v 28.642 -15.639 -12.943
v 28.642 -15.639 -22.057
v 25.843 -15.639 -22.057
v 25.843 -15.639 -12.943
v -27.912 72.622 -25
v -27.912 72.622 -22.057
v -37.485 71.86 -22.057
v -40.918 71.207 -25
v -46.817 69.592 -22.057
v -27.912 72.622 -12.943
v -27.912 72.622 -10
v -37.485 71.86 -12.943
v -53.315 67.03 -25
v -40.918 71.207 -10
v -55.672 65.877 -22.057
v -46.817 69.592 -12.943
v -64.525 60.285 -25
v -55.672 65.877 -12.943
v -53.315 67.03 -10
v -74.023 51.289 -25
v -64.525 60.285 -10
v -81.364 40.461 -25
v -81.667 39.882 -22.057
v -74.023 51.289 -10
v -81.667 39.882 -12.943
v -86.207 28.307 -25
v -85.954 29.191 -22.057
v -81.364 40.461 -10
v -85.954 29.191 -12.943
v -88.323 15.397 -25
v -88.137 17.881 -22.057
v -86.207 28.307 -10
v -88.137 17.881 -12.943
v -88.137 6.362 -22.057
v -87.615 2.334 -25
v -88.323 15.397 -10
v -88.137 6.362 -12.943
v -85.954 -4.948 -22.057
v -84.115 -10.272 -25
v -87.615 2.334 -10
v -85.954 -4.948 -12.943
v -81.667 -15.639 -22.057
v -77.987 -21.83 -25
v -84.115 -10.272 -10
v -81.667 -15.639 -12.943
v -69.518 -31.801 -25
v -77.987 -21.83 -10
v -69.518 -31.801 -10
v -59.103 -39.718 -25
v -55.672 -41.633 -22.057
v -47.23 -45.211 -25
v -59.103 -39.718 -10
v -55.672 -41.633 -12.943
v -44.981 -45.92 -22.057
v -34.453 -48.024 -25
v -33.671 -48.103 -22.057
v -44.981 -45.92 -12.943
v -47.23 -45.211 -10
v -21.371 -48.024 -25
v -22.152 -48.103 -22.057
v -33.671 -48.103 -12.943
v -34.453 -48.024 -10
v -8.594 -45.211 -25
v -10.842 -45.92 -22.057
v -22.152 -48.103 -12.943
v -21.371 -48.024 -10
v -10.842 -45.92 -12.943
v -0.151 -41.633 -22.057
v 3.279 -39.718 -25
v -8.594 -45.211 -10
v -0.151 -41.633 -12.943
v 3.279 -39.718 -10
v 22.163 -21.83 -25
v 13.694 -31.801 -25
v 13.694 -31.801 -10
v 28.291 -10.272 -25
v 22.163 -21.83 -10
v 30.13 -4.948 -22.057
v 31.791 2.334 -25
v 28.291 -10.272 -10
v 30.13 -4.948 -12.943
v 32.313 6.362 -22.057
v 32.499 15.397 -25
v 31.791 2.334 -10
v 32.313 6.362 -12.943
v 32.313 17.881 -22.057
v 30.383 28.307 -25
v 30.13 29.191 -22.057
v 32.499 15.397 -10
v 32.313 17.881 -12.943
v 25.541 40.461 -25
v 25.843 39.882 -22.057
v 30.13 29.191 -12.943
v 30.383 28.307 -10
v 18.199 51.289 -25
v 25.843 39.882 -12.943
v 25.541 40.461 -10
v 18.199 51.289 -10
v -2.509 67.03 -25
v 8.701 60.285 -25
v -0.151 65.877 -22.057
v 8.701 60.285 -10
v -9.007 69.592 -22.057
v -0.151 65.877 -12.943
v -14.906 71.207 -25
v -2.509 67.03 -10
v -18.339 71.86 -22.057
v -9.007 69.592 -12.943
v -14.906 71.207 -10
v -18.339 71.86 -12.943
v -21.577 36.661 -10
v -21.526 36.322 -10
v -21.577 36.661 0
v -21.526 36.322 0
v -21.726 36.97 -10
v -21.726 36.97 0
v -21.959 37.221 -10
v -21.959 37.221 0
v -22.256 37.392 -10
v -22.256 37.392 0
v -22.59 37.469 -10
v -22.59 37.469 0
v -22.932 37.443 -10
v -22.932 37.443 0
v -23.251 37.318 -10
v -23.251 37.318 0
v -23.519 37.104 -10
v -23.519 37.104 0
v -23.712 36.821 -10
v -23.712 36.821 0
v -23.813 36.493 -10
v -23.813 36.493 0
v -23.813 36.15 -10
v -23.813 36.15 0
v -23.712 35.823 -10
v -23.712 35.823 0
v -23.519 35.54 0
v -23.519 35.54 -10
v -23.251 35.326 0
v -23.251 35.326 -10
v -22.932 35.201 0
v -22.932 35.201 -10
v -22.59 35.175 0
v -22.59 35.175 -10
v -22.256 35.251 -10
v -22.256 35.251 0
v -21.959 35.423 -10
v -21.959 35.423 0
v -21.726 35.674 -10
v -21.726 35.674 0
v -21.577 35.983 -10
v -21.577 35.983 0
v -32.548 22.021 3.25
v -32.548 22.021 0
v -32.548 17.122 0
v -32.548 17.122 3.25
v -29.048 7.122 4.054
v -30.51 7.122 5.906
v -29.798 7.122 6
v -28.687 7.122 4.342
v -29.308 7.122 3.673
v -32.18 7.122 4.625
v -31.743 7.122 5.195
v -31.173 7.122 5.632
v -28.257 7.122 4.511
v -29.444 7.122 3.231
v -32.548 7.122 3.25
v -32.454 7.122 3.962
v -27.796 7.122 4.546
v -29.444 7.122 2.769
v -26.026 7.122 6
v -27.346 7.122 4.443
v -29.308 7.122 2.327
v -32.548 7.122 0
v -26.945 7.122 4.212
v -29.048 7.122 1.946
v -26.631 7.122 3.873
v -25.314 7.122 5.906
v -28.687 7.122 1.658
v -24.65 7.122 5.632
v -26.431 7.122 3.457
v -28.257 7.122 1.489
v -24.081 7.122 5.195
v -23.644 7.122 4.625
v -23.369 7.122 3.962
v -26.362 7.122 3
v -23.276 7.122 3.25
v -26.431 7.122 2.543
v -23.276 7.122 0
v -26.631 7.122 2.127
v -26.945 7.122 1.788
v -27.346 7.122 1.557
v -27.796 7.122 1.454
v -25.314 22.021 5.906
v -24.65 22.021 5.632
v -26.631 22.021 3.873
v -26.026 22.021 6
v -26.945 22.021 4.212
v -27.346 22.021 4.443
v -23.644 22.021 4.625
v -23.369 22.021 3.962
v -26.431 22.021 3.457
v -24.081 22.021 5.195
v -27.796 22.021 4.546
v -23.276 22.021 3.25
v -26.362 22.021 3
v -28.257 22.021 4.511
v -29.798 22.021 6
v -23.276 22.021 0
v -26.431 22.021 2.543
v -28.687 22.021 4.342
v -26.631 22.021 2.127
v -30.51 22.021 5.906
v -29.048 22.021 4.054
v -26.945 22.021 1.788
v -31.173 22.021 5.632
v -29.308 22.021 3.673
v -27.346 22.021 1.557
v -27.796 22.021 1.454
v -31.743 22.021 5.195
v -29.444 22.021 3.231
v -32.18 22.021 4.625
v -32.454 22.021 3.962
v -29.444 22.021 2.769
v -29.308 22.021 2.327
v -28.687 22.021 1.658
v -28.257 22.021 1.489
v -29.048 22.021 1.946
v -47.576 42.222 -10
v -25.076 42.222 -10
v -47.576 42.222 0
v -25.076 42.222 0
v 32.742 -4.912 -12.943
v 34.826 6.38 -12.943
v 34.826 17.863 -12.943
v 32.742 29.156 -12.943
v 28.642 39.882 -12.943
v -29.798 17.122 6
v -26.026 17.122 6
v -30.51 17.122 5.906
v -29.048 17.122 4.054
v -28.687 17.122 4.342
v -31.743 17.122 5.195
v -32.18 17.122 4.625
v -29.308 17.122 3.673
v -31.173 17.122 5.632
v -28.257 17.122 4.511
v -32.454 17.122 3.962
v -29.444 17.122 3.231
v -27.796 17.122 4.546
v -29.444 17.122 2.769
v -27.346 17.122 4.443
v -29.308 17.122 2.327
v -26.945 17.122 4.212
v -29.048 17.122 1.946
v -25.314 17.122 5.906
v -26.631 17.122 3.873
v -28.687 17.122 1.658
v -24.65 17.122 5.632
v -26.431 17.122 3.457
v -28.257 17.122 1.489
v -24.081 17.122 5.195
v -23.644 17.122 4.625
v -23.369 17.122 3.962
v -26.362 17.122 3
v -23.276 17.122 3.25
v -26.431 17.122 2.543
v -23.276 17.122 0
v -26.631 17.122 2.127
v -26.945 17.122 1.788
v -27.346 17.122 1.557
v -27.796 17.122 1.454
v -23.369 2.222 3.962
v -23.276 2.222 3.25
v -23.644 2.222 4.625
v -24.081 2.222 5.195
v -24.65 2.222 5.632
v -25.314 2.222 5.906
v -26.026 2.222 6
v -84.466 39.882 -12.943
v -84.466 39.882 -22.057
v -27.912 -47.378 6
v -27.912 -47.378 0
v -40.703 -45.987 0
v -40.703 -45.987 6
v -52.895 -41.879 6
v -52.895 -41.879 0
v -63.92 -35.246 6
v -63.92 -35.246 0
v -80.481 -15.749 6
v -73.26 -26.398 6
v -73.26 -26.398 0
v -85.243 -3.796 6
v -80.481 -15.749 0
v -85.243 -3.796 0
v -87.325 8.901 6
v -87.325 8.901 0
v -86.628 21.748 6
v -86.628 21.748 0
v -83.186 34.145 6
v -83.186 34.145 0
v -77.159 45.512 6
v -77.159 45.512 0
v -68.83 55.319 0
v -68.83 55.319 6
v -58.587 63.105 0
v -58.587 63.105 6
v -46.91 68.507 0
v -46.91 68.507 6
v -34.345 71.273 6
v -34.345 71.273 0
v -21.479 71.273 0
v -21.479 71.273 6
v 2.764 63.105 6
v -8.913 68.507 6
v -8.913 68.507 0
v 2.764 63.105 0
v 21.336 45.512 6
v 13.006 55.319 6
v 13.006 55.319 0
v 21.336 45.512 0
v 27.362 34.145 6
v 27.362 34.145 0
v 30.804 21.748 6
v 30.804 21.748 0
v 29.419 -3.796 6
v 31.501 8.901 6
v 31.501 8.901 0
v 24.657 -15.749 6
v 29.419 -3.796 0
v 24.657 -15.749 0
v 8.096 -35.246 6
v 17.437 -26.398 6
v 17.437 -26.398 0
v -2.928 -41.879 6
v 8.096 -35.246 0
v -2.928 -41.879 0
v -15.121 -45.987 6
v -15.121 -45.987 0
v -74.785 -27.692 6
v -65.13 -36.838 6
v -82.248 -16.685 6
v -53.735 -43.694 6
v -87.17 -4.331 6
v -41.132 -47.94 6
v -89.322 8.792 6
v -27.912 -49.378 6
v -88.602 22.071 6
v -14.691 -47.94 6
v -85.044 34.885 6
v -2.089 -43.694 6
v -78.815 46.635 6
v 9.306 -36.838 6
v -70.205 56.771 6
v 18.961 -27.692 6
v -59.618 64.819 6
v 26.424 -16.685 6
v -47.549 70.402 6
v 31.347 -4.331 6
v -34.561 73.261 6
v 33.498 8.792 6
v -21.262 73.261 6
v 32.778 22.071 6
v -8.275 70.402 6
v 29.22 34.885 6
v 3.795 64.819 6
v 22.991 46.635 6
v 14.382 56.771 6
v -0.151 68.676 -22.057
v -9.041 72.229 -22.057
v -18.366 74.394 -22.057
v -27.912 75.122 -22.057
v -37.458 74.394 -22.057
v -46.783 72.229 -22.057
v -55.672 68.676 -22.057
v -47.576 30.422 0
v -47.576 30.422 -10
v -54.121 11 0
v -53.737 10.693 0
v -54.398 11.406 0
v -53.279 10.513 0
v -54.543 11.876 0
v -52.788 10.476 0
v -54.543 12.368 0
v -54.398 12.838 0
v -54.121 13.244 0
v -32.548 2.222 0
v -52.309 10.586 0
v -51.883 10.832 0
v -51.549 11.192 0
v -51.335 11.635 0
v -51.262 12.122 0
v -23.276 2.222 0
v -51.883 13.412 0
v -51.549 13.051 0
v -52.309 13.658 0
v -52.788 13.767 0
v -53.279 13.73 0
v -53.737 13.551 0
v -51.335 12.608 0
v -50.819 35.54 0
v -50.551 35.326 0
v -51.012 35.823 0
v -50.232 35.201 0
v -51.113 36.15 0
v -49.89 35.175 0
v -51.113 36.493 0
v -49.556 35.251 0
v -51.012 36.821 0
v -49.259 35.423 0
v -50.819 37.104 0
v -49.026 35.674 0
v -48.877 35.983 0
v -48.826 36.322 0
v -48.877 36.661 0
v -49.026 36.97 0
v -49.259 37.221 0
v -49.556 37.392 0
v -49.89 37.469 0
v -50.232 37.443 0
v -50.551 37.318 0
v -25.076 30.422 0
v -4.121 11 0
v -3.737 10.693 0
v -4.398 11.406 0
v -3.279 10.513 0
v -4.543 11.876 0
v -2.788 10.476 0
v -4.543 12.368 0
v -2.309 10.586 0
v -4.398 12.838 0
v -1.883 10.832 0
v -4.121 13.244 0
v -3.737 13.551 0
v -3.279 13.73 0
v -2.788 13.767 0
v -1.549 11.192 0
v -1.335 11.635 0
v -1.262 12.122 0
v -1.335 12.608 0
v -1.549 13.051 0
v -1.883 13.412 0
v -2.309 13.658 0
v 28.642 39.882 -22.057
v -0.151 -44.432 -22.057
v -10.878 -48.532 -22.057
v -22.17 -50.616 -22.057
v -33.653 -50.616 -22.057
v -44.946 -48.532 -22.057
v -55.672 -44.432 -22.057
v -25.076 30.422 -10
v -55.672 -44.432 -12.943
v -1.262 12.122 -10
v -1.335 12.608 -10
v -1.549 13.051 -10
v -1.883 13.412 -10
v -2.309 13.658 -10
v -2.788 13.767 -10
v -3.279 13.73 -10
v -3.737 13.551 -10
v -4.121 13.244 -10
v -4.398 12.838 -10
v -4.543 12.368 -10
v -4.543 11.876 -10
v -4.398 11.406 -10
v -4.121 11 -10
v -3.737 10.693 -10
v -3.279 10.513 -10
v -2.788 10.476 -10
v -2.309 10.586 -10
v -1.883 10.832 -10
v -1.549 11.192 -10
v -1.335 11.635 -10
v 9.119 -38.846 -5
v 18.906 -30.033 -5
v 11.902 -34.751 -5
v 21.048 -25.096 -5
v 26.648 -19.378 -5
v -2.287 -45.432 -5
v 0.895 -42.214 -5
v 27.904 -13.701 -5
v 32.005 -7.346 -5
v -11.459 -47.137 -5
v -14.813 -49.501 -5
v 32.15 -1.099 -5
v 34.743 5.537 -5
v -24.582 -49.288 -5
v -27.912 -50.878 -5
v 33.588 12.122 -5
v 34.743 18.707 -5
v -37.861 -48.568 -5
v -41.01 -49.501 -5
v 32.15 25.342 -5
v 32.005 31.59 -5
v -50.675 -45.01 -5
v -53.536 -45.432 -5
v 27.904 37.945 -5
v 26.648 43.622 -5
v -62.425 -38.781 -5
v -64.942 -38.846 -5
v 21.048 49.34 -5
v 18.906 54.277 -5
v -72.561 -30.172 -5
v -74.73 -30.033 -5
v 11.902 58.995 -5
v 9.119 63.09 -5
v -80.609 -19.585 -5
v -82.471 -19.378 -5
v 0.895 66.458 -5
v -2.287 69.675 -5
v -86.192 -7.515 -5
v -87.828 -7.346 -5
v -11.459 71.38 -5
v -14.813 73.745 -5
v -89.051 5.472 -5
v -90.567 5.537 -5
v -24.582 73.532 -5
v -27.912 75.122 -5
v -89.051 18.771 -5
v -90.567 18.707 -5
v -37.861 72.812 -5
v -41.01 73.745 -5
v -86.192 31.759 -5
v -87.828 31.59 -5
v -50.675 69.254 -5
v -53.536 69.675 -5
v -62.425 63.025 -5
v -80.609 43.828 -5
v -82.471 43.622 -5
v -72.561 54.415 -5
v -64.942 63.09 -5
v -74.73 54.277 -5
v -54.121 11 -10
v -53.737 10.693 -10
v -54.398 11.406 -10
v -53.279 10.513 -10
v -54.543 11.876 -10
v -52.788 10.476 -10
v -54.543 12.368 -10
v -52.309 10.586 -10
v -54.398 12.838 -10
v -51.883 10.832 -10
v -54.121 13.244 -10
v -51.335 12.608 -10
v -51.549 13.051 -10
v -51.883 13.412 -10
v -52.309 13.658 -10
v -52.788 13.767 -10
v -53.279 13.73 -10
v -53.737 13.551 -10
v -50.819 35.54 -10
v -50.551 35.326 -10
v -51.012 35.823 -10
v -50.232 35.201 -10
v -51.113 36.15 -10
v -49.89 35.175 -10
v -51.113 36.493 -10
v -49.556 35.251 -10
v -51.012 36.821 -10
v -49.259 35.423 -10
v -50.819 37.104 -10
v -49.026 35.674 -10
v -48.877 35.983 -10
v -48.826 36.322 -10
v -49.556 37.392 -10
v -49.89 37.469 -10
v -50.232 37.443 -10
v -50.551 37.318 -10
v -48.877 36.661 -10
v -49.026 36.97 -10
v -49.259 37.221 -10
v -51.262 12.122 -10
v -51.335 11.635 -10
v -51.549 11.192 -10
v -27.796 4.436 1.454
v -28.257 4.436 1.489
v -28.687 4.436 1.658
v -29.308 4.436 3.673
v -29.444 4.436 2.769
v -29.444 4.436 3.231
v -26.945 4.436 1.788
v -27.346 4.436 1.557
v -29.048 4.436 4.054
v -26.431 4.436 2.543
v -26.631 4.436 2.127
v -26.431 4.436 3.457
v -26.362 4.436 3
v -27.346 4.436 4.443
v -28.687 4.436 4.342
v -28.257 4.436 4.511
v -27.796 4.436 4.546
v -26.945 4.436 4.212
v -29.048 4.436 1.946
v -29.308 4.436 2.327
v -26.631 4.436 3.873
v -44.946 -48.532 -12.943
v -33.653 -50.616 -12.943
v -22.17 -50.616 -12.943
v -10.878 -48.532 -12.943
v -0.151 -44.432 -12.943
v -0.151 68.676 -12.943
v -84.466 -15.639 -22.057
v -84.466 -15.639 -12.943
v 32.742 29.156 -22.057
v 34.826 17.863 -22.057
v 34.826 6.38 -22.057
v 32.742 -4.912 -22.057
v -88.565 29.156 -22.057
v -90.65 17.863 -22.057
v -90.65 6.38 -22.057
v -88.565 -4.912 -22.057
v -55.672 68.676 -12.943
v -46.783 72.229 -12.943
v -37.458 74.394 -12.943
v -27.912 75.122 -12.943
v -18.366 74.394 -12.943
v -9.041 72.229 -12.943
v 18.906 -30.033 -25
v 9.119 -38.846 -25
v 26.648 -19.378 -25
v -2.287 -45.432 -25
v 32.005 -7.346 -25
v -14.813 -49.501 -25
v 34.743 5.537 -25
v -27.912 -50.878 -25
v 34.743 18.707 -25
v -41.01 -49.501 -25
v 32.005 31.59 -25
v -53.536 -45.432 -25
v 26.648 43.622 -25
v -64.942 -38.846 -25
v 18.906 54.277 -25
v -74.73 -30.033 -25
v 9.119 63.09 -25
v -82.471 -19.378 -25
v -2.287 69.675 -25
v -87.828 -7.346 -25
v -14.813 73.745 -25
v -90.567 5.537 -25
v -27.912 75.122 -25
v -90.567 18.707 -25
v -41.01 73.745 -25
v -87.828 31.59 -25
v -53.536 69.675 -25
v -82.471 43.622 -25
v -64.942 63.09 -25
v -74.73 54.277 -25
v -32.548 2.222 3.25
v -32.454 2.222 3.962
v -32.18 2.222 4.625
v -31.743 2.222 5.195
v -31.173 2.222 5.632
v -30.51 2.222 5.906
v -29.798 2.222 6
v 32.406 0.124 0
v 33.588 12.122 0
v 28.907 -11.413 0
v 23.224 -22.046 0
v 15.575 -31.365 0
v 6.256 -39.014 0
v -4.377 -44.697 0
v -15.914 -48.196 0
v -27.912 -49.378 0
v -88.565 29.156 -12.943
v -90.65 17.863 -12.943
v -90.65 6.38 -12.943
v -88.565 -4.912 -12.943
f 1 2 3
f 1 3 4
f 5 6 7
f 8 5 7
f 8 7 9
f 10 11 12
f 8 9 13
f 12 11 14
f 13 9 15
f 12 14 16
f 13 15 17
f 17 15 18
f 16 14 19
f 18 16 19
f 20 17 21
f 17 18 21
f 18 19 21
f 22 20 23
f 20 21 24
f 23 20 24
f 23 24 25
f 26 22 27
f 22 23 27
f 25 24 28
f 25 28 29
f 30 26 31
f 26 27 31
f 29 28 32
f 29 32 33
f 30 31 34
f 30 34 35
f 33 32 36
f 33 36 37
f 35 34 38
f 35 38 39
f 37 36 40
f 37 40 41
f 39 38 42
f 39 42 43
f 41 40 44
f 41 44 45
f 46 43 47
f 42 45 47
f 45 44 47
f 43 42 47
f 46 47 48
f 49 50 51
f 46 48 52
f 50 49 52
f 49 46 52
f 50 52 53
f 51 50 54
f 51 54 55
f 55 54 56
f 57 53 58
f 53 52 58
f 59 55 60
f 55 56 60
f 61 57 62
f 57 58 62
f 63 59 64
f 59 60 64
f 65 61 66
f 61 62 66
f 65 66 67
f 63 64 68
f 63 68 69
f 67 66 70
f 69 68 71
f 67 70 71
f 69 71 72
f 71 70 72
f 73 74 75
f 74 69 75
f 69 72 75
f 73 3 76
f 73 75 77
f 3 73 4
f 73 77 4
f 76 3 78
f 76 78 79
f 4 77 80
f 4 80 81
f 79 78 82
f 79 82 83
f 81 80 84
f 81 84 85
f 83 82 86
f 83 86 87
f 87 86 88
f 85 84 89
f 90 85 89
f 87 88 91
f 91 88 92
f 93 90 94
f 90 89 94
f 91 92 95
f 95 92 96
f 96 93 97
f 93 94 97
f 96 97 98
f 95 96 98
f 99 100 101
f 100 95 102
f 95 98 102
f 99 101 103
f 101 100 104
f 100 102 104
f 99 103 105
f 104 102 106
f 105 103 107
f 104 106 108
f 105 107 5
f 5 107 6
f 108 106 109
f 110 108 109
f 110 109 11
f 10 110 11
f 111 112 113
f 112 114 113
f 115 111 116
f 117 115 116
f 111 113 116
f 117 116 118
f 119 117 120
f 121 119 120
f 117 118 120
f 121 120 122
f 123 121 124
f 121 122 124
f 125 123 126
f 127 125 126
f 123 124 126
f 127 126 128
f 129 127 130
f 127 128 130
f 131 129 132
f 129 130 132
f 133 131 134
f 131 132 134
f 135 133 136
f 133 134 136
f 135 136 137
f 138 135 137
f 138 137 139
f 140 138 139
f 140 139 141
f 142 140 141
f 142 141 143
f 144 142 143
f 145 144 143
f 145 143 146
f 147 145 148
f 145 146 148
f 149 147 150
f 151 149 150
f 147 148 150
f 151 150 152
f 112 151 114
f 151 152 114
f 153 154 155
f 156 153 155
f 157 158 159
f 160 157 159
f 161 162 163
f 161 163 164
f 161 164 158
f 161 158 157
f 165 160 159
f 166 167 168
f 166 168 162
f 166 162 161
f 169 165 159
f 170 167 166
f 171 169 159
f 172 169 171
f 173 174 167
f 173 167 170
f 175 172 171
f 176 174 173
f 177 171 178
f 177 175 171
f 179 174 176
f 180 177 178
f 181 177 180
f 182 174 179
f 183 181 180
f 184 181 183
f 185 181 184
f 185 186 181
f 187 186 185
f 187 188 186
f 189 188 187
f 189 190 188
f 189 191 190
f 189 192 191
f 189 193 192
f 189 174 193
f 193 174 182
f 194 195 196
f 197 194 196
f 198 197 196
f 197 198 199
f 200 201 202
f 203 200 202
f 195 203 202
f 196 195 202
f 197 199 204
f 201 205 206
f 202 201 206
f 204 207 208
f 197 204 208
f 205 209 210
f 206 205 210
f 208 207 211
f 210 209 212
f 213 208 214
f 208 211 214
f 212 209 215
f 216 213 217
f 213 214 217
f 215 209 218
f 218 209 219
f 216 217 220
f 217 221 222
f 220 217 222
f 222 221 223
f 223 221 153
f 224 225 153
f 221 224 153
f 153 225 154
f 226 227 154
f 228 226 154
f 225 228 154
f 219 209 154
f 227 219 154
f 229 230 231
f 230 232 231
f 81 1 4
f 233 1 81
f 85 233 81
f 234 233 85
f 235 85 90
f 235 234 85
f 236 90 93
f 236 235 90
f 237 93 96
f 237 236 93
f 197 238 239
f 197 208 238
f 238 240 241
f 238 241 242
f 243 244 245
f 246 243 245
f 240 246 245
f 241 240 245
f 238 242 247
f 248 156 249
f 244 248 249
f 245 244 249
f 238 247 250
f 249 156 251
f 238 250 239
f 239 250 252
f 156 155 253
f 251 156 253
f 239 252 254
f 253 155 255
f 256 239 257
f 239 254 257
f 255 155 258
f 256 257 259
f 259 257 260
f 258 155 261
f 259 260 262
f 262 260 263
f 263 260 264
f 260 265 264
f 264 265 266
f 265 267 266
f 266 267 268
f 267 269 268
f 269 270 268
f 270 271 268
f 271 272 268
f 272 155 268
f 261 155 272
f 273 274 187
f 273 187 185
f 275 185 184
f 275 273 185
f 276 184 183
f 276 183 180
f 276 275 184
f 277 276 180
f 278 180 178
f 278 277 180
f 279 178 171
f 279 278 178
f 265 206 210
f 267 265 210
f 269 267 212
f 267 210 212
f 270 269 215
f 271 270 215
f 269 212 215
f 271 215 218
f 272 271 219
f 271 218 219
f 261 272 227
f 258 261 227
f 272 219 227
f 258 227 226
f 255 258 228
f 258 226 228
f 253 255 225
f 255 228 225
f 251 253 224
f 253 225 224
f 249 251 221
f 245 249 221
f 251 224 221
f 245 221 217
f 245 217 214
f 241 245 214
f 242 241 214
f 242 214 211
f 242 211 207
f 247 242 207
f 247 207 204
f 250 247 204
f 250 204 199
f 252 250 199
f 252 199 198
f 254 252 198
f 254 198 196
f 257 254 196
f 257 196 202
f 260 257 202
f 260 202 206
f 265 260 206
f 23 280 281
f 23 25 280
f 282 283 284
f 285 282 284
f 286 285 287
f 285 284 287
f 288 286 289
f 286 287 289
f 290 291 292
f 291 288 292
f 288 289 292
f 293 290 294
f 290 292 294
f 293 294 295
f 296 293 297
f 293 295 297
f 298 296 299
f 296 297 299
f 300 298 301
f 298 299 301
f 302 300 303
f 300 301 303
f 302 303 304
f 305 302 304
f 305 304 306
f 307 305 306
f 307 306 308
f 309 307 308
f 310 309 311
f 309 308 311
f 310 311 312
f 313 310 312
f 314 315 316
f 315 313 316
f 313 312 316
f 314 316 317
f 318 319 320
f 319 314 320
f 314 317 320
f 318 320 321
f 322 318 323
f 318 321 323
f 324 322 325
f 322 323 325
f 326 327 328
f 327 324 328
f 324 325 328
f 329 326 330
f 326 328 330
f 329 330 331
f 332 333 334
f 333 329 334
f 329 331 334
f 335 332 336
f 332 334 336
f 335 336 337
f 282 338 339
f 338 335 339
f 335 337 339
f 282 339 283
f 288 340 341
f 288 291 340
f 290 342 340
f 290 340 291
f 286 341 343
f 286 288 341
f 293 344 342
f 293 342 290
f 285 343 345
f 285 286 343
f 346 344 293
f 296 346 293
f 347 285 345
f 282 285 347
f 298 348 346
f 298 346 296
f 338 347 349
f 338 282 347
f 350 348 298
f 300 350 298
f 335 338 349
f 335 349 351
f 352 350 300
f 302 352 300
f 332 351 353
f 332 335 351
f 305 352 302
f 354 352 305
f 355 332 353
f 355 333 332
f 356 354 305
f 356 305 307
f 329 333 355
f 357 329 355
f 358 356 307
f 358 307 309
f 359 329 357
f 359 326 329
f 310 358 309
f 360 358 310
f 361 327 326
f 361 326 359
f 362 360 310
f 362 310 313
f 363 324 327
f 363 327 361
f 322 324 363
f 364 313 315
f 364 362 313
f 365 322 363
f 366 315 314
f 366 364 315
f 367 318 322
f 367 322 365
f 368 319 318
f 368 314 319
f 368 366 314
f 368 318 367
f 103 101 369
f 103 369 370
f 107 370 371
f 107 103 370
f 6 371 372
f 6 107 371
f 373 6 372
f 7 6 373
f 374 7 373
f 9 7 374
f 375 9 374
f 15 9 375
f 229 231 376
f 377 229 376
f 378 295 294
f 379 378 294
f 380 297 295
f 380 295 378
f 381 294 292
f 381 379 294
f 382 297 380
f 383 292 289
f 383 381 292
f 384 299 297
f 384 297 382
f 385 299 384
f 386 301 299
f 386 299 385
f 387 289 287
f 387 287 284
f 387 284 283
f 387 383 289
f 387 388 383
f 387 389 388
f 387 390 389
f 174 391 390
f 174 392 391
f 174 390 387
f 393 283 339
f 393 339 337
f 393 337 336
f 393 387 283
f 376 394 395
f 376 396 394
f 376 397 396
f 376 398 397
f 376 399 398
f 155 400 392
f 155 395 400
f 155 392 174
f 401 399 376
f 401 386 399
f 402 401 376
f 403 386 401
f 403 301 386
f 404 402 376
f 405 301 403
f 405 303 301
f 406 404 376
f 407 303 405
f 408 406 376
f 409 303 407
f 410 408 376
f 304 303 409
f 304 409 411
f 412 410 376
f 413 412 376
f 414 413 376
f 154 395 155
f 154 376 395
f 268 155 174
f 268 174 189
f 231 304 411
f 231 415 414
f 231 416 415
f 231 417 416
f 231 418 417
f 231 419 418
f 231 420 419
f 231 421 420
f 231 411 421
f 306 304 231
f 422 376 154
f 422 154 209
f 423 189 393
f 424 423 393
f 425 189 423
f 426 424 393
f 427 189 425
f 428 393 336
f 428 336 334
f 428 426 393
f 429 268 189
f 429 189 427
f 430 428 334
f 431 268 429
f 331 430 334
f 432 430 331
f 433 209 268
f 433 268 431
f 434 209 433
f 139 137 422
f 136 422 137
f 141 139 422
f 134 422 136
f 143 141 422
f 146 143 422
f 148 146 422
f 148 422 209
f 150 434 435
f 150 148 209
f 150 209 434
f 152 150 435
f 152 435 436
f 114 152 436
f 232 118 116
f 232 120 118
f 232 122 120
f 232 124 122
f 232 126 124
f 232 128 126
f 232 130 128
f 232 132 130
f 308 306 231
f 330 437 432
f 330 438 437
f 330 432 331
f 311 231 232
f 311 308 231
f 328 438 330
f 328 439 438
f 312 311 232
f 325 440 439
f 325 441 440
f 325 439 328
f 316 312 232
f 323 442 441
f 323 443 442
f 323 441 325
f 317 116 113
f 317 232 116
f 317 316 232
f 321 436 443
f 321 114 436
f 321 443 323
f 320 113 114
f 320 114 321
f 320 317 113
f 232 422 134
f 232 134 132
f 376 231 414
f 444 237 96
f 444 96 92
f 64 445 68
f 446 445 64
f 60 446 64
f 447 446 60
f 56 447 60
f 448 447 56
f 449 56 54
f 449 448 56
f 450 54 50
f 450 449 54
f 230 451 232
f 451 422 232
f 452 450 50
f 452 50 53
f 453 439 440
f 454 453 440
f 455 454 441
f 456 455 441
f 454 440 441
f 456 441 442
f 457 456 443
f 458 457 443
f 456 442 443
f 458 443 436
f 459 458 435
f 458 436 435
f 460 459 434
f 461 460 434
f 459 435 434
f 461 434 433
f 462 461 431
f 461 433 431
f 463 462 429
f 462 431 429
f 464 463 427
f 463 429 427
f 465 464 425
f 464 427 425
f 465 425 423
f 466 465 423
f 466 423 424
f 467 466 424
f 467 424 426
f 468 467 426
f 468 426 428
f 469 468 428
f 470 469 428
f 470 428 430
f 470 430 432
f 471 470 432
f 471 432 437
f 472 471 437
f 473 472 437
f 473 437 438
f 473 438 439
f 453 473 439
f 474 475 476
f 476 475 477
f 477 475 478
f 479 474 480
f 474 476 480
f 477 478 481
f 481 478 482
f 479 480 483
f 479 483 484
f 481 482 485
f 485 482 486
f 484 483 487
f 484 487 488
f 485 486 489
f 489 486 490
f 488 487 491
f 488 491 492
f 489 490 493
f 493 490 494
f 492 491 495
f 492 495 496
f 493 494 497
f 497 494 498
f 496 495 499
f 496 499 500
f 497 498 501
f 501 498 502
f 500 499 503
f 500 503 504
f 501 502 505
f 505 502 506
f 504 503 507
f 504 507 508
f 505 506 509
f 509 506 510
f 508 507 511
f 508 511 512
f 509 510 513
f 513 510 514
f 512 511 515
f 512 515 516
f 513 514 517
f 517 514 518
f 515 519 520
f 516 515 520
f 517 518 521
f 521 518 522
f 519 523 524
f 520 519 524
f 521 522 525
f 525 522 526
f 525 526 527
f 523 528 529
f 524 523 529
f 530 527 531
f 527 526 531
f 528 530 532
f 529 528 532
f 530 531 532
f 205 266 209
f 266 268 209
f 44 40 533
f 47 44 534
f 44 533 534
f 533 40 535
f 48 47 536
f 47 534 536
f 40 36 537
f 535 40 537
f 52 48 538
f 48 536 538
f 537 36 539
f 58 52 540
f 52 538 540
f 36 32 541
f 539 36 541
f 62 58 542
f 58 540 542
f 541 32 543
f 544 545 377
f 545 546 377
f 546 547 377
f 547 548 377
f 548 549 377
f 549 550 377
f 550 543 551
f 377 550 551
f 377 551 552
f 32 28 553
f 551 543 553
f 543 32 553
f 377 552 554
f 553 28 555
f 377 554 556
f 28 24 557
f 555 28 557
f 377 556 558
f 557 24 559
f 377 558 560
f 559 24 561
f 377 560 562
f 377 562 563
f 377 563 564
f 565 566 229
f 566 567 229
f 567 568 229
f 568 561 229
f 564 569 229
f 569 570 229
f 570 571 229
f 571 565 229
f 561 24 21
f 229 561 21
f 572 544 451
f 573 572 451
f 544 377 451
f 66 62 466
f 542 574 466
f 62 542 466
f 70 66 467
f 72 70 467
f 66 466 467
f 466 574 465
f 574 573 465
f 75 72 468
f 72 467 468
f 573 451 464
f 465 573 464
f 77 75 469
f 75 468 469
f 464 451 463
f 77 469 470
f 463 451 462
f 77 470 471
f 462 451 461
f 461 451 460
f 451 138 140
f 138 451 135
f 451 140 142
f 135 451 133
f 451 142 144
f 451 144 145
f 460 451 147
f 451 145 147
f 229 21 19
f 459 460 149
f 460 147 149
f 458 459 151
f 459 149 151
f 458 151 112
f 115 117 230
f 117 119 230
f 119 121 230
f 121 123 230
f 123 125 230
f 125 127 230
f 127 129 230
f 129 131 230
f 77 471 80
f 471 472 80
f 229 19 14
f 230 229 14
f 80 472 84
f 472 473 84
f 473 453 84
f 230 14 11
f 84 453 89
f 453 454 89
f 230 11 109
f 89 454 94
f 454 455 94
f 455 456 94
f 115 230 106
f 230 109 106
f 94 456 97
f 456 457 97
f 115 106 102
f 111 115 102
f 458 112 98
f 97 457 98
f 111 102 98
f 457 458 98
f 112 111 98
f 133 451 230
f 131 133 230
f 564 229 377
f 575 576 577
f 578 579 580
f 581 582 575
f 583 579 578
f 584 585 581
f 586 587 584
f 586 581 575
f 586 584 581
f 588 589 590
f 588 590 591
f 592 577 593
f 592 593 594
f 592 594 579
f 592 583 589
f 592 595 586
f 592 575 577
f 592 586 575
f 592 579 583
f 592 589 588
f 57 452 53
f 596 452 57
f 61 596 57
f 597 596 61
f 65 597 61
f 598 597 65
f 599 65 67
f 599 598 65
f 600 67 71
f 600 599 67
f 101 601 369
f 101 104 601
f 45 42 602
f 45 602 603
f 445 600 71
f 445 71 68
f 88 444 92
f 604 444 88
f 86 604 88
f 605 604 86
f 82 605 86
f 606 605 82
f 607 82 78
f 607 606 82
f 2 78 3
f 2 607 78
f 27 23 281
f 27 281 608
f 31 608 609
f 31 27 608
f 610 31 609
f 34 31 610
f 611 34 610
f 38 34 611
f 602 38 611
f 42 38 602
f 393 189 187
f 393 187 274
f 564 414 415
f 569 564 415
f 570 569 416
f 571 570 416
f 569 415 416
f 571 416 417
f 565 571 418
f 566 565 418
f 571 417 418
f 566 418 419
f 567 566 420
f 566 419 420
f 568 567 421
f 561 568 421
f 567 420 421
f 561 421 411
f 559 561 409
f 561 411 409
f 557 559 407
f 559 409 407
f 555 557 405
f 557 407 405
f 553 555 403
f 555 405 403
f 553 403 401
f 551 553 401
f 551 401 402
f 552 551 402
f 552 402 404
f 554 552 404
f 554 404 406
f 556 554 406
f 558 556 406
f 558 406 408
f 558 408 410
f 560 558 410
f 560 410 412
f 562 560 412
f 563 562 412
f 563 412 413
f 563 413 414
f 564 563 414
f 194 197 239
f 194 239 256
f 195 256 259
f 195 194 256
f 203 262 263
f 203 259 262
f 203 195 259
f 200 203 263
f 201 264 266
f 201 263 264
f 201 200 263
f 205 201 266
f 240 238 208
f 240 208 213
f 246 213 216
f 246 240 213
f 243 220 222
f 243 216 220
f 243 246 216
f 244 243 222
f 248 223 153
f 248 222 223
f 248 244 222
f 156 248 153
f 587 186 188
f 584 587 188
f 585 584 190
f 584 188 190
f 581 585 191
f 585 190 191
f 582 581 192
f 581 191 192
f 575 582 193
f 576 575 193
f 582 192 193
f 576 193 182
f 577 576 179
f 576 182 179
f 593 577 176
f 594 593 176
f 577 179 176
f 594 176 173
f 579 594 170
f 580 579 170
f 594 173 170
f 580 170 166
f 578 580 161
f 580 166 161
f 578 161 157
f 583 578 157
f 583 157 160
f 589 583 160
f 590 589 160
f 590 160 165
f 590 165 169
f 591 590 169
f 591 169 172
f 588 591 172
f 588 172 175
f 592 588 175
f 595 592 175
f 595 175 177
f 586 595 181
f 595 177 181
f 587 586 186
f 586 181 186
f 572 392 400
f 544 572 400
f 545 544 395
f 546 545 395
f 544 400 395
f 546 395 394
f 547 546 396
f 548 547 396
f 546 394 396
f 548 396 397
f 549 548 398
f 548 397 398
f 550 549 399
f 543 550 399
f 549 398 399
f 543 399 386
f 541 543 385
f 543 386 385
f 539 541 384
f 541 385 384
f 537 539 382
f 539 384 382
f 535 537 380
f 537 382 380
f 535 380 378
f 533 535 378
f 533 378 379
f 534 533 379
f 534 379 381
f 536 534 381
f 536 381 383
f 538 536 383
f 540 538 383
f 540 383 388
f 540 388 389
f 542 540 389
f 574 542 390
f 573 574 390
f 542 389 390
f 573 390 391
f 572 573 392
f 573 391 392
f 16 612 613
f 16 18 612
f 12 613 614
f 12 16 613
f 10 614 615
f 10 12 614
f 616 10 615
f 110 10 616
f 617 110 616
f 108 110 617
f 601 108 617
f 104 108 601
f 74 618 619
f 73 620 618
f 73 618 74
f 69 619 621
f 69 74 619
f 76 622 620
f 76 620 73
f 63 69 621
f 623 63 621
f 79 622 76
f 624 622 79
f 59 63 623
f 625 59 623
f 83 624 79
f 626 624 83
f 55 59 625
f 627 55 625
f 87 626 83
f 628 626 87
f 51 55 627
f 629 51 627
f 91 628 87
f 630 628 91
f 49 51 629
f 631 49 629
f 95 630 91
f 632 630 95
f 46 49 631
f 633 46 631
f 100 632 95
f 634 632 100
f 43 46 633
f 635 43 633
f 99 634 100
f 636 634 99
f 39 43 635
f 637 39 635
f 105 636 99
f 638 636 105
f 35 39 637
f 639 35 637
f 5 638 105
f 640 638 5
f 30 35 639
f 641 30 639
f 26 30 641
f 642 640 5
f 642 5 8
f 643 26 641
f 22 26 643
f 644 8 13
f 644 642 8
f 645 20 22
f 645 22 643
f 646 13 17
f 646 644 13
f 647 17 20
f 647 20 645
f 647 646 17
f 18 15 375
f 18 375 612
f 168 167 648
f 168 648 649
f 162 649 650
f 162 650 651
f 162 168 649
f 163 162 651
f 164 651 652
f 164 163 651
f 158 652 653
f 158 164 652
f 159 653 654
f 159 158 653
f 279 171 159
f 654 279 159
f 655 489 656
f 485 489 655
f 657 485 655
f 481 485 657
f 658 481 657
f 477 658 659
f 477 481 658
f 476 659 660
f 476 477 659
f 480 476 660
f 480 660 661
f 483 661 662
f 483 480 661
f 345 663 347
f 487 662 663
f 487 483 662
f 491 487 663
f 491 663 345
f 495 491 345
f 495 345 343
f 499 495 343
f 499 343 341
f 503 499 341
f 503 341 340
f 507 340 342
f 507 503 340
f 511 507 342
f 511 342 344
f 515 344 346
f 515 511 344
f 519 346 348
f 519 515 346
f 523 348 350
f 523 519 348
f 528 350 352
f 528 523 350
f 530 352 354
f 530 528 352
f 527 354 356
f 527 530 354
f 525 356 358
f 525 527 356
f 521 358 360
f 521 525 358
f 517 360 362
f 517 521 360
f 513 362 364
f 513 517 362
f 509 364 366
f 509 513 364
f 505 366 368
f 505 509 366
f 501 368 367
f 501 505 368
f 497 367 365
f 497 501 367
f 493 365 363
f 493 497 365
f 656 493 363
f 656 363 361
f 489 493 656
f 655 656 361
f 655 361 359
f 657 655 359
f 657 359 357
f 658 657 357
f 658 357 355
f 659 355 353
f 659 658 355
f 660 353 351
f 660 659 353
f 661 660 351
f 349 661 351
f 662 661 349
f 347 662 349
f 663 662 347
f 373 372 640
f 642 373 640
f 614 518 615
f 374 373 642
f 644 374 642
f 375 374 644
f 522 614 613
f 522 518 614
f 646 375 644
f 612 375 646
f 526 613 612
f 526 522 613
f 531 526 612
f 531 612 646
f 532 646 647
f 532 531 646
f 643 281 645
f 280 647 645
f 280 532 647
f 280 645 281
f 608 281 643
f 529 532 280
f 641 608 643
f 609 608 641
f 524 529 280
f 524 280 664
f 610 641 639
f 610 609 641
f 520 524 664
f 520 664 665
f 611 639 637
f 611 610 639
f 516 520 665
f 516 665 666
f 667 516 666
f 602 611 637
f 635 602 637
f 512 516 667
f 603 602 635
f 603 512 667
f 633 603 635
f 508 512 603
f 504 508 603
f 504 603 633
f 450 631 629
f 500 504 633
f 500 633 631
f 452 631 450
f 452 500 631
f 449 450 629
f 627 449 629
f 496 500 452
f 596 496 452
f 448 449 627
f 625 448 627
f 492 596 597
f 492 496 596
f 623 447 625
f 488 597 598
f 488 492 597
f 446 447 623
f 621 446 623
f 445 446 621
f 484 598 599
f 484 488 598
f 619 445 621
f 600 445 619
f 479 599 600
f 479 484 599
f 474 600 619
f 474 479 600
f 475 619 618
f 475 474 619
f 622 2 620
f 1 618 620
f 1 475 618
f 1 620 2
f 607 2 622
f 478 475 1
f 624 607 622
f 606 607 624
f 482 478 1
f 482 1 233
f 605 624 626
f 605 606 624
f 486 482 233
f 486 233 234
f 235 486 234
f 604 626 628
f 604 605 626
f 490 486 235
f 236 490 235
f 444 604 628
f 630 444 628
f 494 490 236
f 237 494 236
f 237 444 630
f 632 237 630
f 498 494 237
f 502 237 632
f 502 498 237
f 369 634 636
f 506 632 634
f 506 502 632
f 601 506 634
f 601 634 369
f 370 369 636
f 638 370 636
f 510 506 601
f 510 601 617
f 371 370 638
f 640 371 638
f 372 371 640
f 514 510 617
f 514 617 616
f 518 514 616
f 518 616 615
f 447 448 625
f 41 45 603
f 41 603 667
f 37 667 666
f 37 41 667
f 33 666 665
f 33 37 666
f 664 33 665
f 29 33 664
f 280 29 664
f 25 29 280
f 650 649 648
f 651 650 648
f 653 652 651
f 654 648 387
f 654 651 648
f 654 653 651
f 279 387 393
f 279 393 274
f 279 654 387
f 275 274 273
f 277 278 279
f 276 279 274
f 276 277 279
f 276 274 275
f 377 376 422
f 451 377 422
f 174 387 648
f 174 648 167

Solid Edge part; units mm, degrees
sketch "Sketch1" plane through (0, 0, 0) normal (0, 0, 1) x (1, 0, 0)
  line L0 (-15.0761, 2.2218) -> (-15.0761, 52.2218)
  line L1 (-15.0761, 52.2218) -> (-57.5761, 52.2218)
  line L2 (-57.5761, 52.2218) -> (-57.5761, 2.2218)
  line L3 (-57.5761, 2.2218) -> (-15.0761, 2.2218)
  line L4 (-25.0761, 30.4218) -> (-25.0761, 42.2218)
  line L5 (-25.0761, 42.2218) -> (-47.5761, 42.2218)
  line L6 (-47.5761, 42.2218) -> (-47.5761, 30.4218)
  line L7 (-47.5761, 30.4218) -> (-25.0761, 30.4218)
  dimension "D1" = 22.5
  dimension "D2" = 11.8
  dimension "D3" = 50
  dimension "D4" = 42.5
  dimension "D5" = 4.8989
  dimension "D6" = 4.9
  dimension "D7" = 10
  dimension "D8" = 10
  dimension "D9" = 10
extrude "Protrusion1" add sketch "Sketch1" against normal blind 10
sketch "Sketch2" plane through (0, 0, 0) normal (0, 0, 1) x (1, 0, 0)
  line L0 (-23.2755, 17.1218) -> (-23.2755, 22.0207)
  line L1 (-23.2755, 22.0207) -> (-32.5481, 22.0207)
  line L2 (-32.5481, 22.0207) -> (-32.5481, 17.1218)
  line L3 (-32.5481, 17.1218) -> (-23.2755, 17.1218)
  line L4 (-23.2755, 7.1218) -> (-23.2755, 2.2218)
  line L5 (-23.2755, 2.2218) -> (-32.5481, 2.2218)
  line L6 (-32.5481, 2.2218) -> (-32.5481, 7.1218)
  line L7 (-32.5481, 7.1218) -> (-23.2755, 7.1218)
  dimension "D1" = 22.5
  dimension "D2" = 11.8
  dimension "D3" = 50
  dimension "D4" = 42.5
  dimension "D5" = 4.8989
  dimension "D6" = 4.9
  dimension "D7" = 10
  dimension "D8" = 10
  dimension "D9" = 10
extrude "ExtrudedProtrusion_3" add sketch "Sketch2" along normal blind 6
sketch "Sketch3" plane through (-27.9118, 22.0207, 3) normal (0, 1, 0) x (1, 0, 0)
  circle A0 centre (0, 0) radius 1.55
extrude "ExtrudedCutout_1" cut sketch "Sketch3" against normal blind 17.5849
sketch "Sketch4" plane through (0, 0, 0) normal (0, 0, 1) x (1, 0, 0)
  circle A0 centre (-27.9118, 12.1218) radius 61.5
extrude "ExtrudedProtrusion_4" add sketch "Sketch4" against normal blind 10
sketch "Sketch5" plane through (0, 0, 0) normal (0, 0, 1) x (1, 0, 0)
  line L0 (-47.5761, 42.2218) -> (-47.5761, 30.4218)
  line L1 (-47.5761, 30.4218) -> (-25.0761, 30.4218)
  line L2 (-25.0761, 30.4218) -> (-25.0761, 42.2218)
  line L3 (-25.0761, 42.2218) -> (-47.5761, 42.2218)
extrude "ExtrudedCutout_2" cut sketch "Sketch5" against normal blind 44.8908
sketch "Sketch6" plane through (-27.9118, 12.1218, -5) normal (0, 0, -1) x (0, 1, 0)
  circle A0 centre (0, 0) radius 60.5
  circle A1 centre (0, 0) radius 63
extrude "ExtrudedProtrusion_6" add sketch "Sketch6" along normal blind 20
sketch "Sketch7" plane through (-27.9118, -50.8782, -15) normal (0, -1, 0) x (0, 0, 1)
  line L0 (-7.0569, 27.7607) -> (2.0569, 27.7607)
  line L1 (2.0569, 27.7607) -> (2.0569, -27.7607)
  line L2 (2.0569, -27.7607) -> (-7.0569, -27.7607)
  line L3 (-7.0569, -27.7607) -> (-7.0569, 27.7607)
extrude "ExtrudedCutout_3" cut sketch "Sketch7" against normal blind 172.1374
pattern_circular "Pattern_1" count 4 over 360 about axis through (-27.9118, 12.1218, -25) along (0, 0, 1) of "ExtrudedCutout_3"
sketch "Sketch8" plane through (-27.9118, 12.1218, 0) normal (0, 0, 1) x (0, -1, 0)
  circle A0 centre (0, 0) radius 59.5
  circle A1 centre (0, 0) radius 61.5
extrude "Protrusion2" add sketch "Sketch8" along normal blind 6
fillet "Round_1" radius 2.75 4 edges at (-32.5481, 4.6718, 6) (-23.2755, 4.6718, 6) (-32.5481, 19.5713, 6) (-23.2755, 19.5713, 6)
sketch "Sketch9" plane through (-27.9118, 12.1218, 0) normal (0, 0, 1) x (1, 0, 0)
  circle A0 centre (-22.0643, 24.2) radius 1.15
  circle A1 centre (5.2357, 24.2) radius 1.15
  dimension "D1" = 2.3
extrude "Cutout4" cut sketch "Sketch9" along normal mid plane 85.0753
sketch "Sketch10" plane through (-27.9118, 12.1218, 0) normal (0, 0, 1) x (1, 0, 0)
  circle A0 centre (-25, 0) radius 1.65
  circle A1 centre (25, 0) radius 1.65
  dimension "D1" = 50
  dimension "D2" = 3.3
extrude "ExtrudedCutout_8" cut sketch "Sketch10" along normal mid plane 174.1948
